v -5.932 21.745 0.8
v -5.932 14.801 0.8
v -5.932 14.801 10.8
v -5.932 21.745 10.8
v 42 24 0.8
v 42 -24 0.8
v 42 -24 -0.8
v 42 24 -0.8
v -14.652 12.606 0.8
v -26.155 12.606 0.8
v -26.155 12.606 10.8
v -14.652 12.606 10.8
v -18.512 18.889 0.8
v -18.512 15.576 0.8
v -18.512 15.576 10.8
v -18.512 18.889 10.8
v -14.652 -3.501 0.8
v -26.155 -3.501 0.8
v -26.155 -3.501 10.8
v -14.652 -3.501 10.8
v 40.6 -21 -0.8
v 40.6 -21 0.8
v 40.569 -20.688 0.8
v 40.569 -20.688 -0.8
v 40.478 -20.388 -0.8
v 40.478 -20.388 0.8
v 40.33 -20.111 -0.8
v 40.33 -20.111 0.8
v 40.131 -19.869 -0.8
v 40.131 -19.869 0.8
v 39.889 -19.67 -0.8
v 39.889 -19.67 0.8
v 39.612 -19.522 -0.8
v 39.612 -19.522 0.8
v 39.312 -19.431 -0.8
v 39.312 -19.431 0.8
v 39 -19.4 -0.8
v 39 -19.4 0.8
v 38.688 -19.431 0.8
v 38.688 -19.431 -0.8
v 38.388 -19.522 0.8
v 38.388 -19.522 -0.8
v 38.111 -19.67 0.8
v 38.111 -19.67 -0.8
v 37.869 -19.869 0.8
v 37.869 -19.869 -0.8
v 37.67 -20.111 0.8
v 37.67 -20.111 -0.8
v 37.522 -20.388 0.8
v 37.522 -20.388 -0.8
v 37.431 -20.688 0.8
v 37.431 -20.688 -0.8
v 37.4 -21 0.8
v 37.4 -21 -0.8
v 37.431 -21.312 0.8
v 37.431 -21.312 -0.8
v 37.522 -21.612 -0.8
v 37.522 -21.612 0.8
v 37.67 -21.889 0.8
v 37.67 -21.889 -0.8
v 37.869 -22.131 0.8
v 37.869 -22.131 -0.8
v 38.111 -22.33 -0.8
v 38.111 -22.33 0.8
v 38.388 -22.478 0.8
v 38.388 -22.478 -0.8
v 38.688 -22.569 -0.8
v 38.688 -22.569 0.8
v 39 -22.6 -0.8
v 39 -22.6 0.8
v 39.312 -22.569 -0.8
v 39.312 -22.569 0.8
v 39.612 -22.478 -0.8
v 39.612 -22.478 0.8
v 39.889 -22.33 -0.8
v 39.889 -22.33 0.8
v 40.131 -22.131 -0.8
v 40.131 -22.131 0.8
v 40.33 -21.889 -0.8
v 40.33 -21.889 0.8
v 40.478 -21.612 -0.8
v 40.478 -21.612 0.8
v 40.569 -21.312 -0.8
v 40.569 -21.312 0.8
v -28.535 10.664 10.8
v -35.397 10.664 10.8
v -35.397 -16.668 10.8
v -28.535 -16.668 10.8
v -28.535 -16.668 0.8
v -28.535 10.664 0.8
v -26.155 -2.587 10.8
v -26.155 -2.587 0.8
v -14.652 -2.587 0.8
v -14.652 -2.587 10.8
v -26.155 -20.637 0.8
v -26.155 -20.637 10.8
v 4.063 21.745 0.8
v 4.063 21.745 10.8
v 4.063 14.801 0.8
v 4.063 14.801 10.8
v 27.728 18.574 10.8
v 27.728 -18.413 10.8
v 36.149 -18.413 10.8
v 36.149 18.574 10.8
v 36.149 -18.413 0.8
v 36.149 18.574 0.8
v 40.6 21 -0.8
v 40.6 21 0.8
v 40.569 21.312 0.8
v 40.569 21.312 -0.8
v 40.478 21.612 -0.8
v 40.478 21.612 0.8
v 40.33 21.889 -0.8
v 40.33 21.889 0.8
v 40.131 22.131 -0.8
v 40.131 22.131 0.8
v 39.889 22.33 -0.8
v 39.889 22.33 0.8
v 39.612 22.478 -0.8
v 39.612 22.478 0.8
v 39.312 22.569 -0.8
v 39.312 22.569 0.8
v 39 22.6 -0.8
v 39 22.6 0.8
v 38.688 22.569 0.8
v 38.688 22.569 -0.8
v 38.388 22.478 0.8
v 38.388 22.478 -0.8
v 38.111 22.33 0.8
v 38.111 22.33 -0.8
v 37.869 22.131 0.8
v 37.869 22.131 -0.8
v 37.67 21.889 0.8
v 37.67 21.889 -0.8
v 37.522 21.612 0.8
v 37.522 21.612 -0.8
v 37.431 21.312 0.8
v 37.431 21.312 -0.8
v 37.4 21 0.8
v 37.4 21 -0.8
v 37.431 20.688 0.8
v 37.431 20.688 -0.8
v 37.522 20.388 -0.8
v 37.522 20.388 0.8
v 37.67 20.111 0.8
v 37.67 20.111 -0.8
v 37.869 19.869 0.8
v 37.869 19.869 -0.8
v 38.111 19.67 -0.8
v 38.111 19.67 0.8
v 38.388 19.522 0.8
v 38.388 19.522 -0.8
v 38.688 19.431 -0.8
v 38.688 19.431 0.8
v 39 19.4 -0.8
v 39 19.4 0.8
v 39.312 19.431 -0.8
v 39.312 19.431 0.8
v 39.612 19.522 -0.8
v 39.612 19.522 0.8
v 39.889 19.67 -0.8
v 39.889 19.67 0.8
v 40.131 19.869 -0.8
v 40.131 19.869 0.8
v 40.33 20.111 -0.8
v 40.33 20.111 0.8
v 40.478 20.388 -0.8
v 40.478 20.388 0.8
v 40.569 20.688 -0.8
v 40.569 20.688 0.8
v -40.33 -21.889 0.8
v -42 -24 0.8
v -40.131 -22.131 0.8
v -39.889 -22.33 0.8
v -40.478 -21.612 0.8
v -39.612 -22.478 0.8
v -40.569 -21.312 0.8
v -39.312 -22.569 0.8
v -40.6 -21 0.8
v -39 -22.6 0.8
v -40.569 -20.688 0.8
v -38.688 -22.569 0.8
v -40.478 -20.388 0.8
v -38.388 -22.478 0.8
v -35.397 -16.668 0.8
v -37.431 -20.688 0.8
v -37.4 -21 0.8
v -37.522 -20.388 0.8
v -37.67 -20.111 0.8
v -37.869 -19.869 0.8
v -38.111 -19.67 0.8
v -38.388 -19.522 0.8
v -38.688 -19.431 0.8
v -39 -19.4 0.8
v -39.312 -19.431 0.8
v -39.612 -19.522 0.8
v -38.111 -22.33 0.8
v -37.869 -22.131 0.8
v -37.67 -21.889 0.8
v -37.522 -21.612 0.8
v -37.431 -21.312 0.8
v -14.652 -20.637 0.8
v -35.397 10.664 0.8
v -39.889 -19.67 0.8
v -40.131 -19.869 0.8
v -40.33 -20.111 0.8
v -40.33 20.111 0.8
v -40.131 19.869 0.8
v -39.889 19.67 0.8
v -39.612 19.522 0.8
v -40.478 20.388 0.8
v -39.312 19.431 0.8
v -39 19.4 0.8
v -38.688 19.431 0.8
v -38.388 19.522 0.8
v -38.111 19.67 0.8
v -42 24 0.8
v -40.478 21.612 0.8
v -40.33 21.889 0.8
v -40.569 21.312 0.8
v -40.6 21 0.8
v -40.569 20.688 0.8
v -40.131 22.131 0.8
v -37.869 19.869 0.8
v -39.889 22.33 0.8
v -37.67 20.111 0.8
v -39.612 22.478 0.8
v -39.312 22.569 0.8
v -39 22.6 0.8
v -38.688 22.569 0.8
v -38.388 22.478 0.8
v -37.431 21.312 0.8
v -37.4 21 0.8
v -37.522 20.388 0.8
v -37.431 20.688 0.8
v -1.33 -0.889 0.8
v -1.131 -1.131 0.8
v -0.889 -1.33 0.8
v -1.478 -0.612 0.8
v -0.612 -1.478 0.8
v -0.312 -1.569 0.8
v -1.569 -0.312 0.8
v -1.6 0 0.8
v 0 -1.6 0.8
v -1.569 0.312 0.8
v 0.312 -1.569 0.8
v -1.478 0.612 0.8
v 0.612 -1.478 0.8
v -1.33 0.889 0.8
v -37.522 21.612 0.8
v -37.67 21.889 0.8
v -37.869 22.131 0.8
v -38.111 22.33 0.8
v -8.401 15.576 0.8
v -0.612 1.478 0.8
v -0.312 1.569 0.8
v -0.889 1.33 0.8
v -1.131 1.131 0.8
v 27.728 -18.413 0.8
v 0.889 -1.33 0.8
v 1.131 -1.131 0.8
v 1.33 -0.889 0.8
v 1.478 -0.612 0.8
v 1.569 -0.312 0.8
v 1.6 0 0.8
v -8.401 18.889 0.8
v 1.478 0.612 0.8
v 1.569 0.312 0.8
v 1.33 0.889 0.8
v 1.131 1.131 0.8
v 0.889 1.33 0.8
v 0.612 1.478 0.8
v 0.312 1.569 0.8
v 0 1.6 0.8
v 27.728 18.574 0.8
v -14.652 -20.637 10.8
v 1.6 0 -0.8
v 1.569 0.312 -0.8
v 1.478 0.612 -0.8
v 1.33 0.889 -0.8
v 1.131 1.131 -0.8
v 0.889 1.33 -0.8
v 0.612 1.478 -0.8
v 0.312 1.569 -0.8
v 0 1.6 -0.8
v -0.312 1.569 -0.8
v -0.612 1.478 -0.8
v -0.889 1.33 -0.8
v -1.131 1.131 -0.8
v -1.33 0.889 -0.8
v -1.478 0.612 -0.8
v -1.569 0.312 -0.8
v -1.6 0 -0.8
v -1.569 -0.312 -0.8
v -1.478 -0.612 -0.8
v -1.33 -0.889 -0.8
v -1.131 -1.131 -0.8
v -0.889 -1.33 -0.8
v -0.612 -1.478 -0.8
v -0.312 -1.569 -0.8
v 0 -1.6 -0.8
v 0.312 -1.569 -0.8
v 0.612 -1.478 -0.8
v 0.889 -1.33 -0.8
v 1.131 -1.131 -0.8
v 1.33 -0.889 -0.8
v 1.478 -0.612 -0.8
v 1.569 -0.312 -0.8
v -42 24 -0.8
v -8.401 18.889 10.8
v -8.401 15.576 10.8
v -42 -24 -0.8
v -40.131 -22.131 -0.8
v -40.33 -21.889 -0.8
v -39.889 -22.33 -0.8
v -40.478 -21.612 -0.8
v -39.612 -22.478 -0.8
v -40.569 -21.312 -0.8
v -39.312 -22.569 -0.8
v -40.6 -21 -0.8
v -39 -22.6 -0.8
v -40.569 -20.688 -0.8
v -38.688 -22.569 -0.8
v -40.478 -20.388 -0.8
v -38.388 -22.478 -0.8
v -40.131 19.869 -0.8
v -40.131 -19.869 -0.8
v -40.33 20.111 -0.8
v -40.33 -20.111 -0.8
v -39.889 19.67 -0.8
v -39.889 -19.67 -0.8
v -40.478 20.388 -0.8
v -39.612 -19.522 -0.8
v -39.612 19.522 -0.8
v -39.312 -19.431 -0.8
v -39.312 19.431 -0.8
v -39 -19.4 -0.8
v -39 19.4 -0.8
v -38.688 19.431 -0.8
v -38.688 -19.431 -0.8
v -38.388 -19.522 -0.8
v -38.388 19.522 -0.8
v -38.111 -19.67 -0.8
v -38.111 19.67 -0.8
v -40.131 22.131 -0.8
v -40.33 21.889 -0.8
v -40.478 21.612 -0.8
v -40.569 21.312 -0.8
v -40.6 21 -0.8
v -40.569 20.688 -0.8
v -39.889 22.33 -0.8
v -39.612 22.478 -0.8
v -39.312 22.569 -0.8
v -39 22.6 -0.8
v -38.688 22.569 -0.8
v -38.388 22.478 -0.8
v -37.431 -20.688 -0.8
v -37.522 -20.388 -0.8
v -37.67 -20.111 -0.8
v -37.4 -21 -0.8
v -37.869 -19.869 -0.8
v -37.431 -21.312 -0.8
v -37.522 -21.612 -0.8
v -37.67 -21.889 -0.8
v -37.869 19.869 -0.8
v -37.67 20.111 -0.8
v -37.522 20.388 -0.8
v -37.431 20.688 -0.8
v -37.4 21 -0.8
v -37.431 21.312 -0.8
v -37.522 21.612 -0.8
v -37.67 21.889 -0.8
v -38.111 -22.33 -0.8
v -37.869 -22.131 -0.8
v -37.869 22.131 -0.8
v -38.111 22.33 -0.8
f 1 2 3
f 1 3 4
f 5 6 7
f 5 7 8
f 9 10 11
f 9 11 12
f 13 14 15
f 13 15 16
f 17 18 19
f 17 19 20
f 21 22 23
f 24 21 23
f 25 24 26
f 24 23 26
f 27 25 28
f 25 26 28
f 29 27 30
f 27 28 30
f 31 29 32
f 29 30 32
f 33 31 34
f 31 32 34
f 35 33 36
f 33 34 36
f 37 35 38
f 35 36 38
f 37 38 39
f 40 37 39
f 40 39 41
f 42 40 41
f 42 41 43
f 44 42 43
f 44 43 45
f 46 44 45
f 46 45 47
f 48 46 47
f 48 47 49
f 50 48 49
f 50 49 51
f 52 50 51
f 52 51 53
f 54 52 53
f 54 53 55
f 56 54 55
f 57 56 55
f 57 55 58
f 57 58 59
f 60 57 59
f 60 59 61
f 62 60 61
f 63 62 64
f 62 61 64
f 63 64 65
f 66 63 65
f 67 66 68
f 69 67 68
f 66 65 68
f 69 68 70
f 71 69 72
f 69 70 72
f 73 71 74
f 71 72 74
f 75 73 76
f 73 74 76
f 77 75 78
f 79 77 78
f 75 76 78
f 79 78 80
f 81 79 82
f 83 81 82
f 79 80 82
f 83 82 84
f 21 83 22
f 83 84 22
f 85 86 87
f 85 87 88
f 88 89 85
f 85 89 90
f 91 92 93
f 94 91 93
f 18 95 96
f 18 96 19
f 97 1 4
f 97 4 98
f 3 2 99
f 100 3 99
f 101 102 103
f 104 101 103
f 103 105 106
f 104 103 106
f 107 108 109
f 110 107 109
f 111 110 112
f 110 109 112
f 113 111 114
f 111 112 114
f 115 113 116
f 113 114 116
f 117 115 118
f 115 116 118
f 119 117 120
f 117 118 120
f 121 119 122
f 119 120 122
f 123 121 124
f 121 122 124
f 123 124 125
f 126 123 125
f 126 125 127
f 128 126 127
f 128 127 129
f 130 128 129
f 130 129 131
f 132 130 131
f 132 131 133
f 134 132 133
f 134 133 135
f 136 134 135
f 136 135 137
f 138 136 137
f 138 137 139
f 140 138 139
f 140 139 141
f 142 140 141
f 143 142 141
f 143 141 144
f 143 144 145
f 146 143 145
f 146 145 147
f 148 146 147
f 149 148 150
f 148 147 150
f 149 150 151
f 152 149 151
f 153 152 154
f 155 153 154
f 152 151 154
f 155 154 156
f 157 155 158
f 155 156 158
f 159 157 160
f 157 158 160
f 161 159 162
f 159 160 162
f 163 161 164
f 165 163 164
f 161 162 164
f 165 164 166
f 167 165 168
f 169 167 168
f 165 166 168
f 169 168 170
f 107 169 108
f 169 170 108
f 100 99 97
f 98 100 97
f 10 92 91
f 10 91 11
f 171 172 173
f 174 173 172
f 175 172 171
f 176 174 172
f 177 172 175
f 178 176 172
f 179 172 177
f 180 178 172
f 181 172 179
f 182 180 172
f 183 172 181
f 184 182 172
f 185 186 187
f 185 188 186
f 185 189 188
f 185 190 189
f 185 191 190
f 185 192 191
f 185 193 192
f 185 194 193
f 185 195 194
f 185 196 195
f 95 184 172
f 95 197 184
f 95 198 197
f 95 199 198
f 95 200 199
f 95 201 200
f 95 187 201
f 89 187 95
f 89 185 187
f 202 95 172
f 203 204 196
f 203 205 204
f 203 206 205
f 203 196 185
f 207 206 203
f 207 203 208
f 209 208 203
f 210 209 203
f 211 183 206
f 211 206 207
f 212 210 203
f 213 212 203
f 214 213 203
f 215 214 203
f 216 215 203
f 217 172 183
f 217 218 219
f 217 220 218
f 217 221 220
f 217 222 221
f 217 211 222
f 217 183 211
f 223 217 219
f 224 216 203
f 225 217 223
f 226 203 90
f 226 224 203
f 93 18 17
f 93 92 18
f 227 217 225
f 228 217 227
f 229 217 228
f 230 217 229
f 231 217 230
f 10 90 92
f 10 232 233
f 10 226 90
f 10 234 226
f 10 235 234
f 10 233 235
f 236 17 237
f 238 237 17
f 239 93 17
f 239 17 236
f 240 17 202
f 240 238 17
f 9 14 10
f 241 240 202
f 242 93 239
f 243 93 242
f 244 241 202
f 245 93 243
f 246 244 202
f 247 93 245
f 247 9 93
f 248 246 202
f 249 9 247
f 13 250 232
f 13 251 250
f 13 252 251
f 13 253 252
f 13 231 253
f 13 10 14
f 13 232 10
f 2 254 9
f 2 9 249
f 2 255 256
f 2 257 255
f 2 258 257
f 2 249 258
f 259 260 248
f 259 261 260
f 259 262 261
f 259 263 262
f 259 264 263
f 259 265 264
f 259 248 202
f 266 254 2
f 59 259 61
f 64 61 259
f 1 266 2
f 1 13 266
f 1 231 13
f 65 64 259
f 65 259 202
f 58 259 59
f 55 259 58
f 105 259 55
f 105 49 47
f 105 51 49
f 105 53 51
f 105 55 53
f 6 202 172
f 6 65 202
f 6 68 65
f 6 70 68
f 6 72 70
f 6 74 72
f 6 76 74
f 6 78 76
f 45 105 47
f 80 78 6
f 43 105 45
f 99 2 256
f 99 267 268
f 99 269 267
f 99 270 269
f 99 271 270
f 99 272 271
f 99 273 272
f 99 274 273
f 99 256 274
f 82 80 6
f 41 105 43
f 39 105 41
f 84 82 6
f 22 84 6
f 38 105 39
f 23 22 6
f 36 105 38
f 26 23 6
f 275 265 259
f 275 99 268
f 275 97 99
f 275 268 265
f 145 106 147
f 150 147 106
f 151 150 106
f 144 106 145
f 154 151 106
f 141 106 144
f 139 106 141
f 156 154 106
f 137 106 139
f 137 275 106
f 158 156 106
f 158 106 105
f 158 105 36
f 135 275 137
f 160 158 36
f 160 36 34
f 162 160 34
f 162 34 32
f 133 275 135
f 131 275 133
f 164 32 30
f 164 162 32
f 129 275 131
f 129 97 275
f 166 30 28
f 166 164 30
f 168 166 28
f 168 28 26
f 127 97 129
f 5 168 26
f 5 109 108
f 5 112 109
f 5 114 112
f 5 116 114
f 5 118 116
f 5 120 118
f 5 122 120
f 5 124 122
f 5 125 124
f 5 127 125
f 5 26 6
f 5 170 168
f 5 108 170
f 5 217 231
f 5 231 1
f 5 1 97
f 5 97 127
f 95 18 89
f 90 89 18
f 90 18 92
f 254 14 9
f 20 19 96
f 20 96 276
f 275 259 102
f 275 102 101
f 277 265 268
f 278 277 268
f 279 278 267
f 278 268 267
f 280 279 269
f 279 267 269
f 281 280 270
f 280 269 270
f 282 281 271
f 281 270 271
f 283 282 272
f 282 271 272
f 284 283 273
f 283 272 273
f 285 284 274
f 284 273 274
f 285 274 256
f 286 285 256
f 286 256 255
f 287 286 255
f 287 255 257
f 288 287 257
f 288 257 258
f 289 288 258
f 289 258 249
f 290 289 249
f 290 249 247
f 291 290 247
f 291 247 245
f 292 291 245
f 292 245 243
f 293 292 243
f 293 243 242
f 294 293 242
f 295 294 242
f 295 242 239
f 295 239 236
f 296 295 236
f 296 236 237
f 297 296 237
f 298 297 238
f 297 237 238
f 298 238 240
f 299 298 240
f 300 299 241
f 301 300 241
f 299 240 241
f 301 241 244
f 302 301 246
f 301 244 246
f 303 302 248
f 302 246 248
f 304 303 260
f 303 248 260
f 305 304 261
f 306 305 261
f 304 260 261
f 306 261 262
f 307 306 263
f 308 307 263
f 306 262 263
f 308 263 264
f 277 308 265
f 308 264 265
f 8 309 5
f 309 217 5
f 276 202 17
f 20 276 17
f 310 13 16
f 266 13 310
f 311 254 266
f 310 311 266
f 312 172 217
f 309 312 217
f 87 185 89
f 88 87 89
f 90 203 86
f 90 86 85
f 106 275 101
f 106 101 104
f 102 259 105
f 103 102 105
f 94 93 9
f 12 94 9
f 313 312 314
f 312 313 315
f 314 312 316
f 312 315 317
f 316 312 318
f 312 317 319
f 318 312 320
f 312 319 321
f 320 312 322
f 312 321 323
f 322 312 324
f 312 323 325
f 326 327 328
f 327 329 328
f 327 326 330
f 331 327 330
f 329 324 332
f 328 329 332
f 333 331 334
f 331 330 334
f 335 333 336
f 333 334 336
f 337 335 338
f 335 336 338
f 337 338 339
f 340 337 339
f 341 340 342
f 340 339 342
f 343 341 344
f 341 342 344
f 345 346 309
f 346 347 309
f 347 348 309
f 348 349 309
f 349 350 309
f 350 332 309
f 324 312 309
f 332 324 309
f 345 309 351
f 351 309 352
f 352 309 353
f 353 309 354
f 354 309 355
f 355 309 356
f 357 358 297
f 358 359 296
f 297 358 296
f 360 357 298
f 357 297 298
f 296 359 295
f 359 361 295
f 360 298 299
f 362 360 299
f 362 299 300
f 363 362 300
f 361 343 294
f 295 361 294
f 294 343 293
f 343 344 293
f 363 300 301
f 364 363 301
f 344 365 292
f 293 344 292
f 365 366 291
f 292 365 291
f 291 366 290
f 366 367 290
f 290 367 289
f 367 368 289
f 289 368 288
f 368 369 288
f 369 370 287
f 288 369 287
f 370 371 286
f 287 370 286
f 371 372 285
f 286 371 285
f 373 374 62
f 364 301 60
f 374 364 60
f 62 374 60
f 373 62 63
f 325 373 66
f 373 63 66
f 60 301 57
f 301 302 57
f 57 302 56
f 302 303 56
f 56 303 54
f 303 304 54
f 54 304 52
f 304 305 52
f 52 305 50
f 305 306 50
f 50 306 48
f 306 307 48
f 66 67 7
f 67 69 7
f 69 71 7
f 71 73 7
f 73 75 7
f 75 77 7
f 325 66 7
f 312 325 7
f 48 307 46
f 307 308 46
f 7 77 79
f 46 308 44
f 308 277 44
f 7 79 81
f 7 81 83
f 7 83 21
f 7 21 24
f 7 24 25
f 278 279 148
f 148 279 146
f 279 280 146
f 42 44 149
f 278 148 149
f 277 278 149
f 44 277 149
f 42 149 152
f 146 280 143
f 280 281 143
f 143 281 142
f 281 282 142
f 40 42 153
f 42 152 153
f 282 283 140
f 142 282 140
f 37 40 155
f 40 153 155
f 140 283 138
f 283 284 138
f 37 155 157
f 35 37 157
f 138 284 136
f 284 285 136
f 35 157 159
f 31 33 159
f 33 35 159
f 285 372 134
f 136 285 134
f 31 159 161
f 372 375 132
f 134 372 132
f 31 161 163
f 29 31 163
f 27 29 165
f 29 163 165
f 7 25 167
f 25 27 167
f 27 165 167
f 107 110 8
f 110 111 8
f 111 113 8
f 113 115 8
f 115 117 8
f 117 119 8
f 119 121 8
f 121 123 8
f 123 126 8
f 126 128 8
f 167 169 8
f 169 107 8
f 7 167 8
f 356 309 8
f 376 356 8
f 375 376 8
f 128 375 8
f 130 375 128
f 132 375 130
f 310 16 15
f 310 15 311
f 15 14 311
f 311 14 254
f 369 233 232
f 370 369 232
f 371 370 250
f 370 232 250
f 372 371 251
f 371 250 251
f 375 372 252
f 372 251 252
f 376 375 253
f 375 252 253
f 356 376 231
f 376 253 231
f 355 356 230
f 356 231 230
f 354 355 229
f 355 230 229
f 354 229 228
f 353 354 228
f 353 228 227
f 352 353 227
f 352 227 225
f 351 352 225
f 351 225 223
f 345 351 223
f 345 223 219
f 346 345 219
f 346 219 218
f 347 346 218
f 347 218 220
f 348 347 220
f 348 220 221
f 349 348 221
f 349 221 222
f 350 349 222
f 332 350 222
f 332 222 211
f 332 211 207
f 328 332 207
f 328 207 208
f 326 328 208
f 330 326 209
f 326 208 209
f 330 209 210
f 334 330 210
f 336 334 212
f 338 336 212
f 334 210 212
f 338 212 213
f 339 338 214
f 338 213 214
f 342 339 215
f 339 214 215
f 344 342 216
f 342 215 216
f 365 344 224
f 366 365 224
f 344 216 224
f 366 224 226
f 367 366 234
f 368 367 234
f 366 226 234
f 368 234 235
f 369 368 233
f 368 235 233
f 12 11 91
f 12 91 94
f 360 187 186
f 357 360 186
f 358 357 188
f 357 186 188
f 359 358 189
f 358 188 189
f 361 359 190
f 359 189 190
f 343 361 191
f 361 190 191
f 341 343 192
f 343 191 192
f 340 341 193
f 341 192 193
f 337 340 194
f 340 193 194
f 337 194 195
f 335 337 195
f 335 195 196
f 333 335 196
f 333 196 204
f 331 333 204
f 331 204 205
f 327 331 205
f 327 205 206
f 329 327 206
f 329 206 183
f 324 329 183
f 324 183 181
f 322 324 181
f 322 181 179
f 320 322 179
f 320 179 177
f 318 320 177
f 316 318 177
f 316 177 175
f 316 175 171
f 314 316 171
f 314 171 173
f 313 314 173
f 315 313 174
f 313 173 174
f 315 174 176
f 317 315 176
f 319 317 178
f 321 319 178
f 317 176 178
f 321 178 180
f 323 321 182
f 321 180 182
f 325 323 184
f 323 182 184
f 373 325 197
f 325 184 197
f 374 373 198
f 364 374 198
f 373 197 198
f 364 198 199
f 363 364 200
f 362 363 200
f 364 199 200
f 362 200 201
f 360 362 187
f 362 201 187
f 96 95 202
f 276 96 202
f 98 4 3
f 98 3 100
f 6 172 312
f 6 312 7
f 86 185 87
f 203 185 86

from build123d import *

# Parameters (mm, degrees)
SKETCH1_W           = 84
SKETCH1_H           = 48
BOSS_EXTRUDE1_DEPTH = 0.8
SKETCH2_R           = 1.6
CUT_EXTRUDE1_DEPTH  = 49.4
SKETCH3_W           = 6.862119169
SKETCH3_H           = 27.332124702
SKETCH3_W_2         = 10.110629261
SKETCH3_H_2         = 3.312844108
SKETCH3_W_3         = 9.995650326
SKETCH3_H_3         = 6.943369618
SKETCH3_W_4         = 11.50293093
SKETCH3_H_4         = 17.135400557
SKETCH3_H_5         = 15.193388494
SKETCH3_W_5         = 8.420598576
SKETCH3_H_6         = 36.987675992
BOSS_EXTRUDE2_DEPTH = 10


with BuildPart() as part:
    # Sketch1 → Boss-Extrude1 (new, symmetric)
    with BuildSketch(Plane.XY):
        Rectangle(SKETCH1_W, SKETCH1_H)
    extrude(amount=BOSS_EXTRUDE1_DEPTH, both=True)

    # Sketch2 → Cut-Extrude1 (cut, through all)
    with BuildSketch(Plane.XY.offset(0.8)):
        with Locations((-39, -21)):
            Circle(SKETCH2_R)
        with Locations((-39, 21)):
            Circle(SKETCH2_R)
        Circle(SKETCH2_R)
        with Locations((39, -21)):
            Circle(SKETCH2_R)
        with Locations((39, 21)):
            Circle(SKETCH2_R)
    extrude(amount=-CUT_EXTRUDE1_DEPTH, mode=Mode.SUBTRACT)

    # Sketch3 → Boss-Extrude2 (add)
    with BuildSketch(Plane.XY.offset(0.8)):
        with Locations((-31.966191102, -3.002126176)):
            Rectangle(SKETCH3_W, SKETCH3_H)
        with Locations((-13.456350493, 17.232506389)):
            Rectangle(SKETCH3_W_2, SKETCH3_H_2)
        with Locations((-0.93444373, 18.273143727)):
            Rectangle(SKETCH3_W_3, SKETCH3_H_3)
        with Locations((-20.403749308, -12.069028564)):
            Rectangle(SKETCH3_W_4, SKETCH3_H_4)
        with Locations((-20.403749308, 5.009253991)):
            Rectangle(SKETCH3_W_4, SKETCH3_H_5)
        with Locations((31.938626633, 0.080507911)):
            Rectangle(SKETCH3_W_5, SKETCH3_H_6)
    extrude(amount=BOSS_EXTRUDE2_DEPTH)


solid = part.part
